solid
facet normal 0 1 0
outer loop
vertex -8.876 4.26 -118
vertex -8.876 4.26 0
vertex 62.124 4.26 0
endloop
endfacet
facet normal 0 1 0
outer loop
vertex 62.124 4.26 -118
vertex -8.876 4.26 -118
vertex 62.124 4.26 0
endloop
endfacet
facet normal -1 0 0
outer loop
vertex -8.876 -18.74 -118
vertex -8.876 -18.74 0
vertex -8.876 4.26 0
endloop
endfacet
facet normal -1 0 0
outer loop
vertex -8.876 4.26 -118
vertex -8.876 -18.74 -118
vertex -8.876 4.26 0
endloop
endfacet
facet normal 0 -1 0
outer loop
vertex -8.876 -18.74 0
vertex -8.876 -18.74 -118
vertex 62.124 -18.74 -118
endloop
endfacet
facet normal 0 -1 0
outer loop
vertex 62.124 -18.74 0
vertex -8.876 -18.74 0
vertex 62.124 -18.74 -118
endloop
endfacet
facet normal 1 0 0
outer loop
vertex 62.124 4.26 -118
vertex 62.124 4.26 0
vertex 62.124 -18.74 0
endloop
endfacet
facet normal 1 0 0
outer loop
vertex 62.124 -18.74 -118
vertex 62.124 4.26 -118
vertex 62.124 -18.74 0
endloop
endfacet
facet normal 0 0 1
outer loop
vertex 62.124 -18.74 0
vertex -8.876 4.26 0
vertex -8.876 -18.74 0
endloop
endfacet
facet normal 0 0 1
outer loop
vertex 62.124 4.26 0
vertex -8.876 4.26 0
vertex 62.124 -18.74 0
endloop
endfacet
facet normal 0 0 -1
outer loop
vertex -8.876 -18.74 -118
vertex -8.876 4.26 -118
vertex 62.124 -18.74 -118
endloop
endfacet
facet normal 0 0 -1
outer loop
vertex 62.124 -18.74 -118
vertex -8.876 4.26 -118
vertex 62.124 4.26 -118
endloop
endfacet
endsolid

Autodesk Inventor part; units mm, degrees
ref_plane "YZ Plane" through (0, 0, 0) normal (1, 0, 0) x (0, 1, 0)
ref_plane "XZ Plane" through (0, 0, 0) normal (0, 1, 0) x (-1, 0, 0)
ref_plane "XY Plane" through (0, 0, 0) normal (0, 0, 1) x (1, 0, 0)
sketch "Sketch1" plane through (0, 0, 0) normal (0, 0, 1) x (1, 0, 0)
  line L0 (-8.8755, 3.2604) -> (35.1245, 3.2604)
  line L1 (35.1245, 3.2604) -> (35.1245, -18.7396)
  line L2 (35.1245, -18.7396) -> (-8.8755, -18.7396)
  line L3 (-8.8755, -18.7396) -> (-8.8755, 3.2604)
  point P0 (0, 0)
  dimension "d0" = 44
  dimension "d1" = 22
extrude "Extrusion1" add sketch "Sketch1" against normal blind 152
sketch "Sketch2" plane through (35.1245, -18.7396, 0) normal (1, 0, 0) x (0, 0, -1)
  line L0 (152, 22) -> (152, 0) projected
  line L1 (0, 22) -> (152, 22) projected
  line L2 (0, 0) -> (152, 0) projected
  line L3 (0, 0) -> (0, 22) projected
  point P0 (0, 18.7396)
extrude "Extrusion2" add sketch "Sketch2" along normal blind 20
sketch "Sketch3" plane through (-8.8755, -18.7396, -152) normal (0, -1, 0) x (1, 0, 0)
  line L0 (0, 152) -> (64, 152) projected
  line L1 (0, 0) -> (64, 0) projected
  line L2 (64, 0) -> (64, 152) projected
  line L3 (64, 0) -> (71, 0)
  line L4 (71, 0) -> (71, 152)
  line L5 (71, 152) -> (64, 152)
  line L6 (64, 152) -> (64, 0)
  point P0 (8.8755, 152)
  dimension "d6" = 64
  dimension "d7" = 7
extrude "Extrusion3" add sketch "Sketch3" against normal up to surface (22 mm away)
sketch "Sketch4" plane through (-8.8755, -18.7396, -152) normal (0, -1, 0) x (1, 0, 0)
  line L0 (0, 152) -> (0, 0) projected
  line L1 (0, 152) -> (71, 152) projected
  line L2 (71, 0) -> (71, 152) projected
  line L3 (0, 152) -> (71, 152)
  line L4 (71, 152) -> (71, 34)
  line L5 (71, 34) -> (0, 34)
  line L6 (0, 34) -> (0, 152)
  point P0 (8.8755, 152)
  dimension "d10" = 152
  dimension "d11" = 118
extrude "Extrusion4" cut sketch "Sketch4" against normal blind 10 keep common part
sketch "Sketch5" plane through (0, 0, 0) normal (0, 0, 1) x (1, 0, 0)
  line L0 (62.1245, -18.7396) -> (62.1245, -8.7396) projected
  line L1 (-8.8755, -18.7396) -> (62.1245, -18.7396) projected
  line L2 (62.1245, -18.7396) -> (-8.8755, -18.7396)
  line L3 (-8.8755, -18.7396) -> (-8.8755, 4.2604)
  line L4 (-8.8755, 4.2604) -> (62.1245, 4.2604)
  line L5 (62.1245, 4.2604) -> (62.1245, -18.7396)
  line L6 (-8.8755, -8.7396) -> (62.1245, -8.7396) projected
  point P0 (0, 0)
  dimension "d14" = 10
  dimension "d15" = 23
extrude "Extrusion5" add sketch "Sketch5" against normal up to surface (118 mm away) contours L6 L3 L4 L5
properties part number "LiPo3000mAH"
